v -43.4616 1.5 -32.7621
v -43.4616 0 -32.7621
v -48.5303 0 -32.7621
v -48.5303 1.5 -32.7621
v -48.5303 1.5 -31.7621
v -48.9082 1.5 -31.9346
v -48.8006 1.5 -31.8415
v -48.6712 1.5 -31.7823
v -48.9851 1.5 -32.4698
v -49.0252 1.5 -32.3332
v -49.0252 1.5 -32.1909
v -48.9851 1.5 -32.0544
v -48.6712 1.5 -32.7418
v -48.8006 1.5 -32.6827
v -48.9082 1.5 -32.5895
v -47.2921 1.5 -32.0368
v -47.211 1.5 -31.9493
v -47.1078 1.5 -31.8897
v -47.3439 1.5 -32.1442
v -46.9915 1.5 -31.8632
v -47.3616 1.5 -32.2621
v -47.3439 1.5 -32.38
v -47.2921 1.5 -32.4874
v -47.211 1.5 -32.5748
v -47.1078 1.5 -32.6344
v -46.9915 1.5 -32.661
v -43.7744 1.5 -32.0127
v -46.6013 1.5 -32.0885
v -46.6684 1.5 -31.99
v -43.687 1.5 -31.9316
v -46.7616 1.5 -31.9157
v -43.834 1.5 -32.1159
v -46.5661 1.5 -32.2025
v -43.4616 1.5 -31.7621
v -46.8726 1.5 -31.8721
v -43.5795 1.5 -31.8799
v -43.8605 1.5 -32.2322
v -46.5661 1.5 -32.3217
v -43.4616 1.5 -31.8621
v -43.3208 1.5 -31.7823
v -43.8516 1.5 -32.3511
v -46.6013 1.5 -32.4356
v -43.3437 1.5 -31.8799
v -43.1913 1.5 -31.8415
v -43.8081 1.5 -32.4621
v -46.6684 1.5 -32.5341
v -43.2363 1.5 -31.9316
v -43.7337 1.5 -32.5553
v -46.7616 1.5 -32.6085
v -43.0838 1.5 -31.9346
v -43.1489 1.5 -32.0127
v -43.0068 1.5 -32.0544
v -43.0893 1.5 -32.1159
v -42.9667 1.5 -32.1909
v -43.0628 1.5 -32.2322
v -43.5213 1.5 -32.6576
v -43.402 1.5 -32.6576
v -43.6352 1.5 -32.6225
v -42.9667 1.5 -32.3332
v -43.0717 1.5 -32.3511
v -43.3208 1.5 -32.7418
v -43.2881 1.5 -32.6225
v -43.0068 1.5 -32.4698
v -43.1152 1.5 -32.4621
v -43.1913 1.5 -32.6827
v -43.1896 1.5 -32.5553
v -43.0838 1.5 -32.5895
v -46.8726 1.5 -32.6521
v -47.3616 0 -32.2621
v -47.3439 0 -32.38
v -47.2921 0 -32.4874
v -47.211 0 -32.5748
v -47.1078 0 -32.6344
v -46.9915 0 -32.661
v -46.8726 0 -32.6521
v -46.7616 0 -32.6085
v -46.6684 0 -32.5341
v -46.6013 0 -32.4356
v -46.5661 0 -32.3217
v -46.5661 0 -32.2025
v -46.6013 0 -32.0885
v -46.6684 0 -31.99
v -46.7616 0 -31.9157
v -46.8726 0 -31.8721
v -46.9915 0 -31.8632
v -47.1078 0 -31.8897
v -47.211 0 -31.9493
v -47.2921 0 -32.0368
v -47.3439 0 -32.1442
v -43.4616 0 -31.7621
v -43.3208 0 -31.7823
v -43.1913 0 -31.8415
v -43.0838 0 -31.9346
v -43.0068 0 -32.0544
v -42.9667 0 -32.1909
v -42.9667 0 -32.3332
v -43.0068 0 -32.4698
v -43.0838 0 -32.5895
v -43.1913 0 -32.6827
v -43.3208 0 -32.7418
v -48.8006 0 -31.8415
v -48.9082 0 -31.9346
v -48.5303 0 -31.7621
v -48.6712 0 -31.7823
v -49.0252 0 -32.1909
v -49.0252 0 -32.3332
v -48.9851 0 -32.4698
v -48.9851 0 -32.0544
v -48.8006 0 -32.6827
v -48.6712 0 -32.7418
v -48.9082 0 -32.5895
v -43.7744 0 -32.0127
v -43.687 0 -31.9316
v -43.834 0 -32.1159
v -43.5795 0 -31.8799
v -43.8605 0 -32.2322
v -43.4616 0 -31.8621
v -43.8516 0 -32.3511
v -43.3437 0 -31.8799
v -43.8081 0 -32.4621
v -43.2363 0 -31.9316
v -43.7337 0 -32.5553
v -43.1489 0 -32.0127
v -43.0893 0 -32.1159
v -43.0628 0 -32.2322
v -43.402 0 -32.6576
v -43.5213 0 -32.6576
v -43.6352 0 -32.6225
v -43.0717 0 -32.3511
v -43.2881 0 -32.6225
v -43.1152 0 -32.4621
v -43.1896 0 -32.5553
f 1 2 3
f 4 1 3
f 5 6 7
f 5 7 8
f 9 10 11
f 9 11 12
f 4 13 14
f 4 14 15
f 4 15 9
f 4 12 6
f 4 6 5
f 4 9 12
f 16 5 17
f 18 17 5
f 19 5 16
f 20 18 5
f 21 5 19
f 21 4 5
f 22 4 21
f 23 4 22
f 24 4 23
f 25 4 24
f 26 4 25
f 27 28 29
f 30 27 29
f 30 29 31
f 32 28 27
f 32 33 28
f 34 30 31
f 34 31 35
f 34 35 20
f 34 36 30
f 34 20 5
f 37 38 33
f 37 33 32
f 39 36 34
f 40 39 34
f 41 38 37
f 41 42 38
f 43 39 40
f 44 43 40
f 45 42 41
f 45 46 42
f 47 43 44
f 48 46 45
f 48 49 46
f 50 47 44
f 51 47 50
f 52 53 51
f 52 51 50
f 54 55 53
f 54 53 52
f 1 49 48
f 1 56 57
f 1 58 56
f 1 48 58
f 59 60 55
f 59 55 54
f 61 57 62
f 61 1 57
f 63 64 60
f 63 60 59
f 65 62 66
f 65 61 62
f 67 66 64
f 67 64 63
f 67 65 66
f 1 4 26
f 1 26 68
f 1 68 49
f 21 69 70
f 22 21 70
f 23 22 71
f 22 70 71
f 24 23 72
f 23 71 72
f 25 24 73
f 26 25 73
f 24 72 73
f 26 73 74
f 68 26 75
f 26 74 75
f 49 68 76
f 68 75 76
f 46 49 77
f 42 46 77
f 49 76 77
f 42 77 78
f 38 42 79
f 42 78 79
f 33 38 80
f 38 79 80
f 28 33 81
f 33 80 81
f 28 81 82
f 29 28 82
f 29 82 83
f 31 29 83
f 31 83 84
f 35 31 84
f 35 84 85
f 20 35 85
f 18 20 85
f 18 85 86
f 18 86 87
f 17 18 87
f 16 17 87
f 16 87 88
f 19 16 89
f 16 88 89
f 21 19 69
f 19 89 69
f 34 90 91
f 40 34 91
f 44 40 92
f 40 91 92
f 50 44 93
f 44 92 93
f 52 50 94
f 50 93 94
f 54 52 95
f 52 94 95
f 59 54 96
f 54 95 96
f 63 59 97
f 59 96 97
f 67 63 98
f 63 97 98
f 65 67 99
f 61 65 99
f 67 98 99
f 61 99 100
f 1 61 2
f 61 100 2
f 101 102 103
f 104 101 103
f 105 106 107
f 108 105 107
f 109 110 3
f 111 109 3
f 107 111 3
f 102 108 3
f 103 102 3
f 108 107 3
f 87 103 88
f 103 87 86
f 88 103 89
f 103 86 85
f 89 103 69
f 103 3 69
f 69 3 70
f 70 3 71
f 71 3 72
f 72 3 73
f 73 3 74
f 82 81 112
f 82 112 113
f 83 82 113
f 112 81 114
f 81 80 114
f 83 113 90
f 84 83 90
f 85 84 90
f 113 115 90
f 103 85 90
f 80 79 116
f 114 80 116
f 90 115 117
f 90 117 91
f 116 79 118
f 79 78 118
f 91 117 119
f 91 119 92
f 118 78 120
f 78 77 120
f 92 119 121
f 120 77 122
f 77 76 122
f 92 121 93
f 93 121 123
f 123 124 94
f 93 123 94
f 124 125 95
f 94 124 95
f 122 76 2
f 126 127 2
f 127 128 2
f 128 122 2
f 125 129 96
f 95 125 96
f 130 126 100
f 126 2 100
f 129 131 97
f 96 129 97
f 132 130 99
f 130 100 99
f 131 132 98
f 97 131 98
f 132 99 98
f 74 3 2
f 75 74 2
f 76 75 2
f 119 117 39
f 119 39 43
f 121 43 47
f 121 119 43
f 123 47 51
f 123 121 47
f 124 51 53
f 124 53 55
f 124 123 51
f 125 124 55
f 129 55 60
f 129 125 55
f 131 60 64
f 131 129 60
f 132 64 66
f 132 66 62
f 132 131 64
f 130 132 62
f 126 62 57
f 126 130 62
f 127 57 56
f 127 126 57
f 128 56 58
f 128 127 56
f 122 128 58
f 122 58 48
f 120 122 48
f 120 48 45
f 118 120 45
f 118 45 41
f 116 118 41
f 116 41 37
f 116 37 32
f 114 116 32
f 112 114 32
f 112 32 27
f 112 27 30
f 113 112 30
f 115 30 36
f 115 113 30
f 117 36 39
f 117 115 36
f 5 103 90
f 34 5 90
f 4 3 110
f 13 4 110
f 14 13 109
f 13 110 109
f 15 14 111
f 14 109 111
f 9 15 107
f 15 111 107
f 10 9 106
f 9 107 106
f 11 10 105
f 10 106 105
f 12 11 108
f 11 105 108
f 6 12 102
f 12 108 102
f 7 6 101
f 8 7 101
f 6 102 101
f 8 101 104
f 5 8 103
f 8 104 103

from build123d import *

# Parameters (mm, degrees)
SKETCH1_R           = 0.4
BOSS_EXTRUDE1_DEPTH = 1.5


with BuildPart() as part:
    # Sketch1 → Boss-Extrude1 (new body)
    with BuildSketch(Plane(origin=(0, 0, 0), x_dir=(1, 0, 0), z_dir=(0, 1, 0))):
        with BuildLine():
            Line((-43.461642965, 32.7620803), (-48.53032857, 32.7620803))
            ThreePointArc((-48.53032857, 32.7620803), (-49.03032857, 32.2620803), (-48.53032857, 31.7620803))
            Line((-48.53032857, 31.7620803), (-43.461642965, 31.7620803))
            ThreePointArc((-43.461642965, 31.7620803), (-42.961642965, 32.2620803), (-43.461642965, 32.7620803))
        make_face()
        with BuildLine():
            ThreePointArc((-46.561642965, 32.2620803), (-46.961642965, 31.8620803), (-47.361642965, 32.2620803))
            ThreePointArc((-47.361642965, 32.2620803), (-46.961642965, 32.6620803), (-46.561642965, 32.2620803))
        make_face(mode=Mode.SUBTRACT)
        with Locations(Location((-43.461642965, 32.2620803, 0), (0, 0, 270))):
            Circle(SKETCH1_R, mode=Mode.SUBTRACT)
    extrude(amount=BOSS_EXTRUDE1_DEPTH)


solid = part.part
